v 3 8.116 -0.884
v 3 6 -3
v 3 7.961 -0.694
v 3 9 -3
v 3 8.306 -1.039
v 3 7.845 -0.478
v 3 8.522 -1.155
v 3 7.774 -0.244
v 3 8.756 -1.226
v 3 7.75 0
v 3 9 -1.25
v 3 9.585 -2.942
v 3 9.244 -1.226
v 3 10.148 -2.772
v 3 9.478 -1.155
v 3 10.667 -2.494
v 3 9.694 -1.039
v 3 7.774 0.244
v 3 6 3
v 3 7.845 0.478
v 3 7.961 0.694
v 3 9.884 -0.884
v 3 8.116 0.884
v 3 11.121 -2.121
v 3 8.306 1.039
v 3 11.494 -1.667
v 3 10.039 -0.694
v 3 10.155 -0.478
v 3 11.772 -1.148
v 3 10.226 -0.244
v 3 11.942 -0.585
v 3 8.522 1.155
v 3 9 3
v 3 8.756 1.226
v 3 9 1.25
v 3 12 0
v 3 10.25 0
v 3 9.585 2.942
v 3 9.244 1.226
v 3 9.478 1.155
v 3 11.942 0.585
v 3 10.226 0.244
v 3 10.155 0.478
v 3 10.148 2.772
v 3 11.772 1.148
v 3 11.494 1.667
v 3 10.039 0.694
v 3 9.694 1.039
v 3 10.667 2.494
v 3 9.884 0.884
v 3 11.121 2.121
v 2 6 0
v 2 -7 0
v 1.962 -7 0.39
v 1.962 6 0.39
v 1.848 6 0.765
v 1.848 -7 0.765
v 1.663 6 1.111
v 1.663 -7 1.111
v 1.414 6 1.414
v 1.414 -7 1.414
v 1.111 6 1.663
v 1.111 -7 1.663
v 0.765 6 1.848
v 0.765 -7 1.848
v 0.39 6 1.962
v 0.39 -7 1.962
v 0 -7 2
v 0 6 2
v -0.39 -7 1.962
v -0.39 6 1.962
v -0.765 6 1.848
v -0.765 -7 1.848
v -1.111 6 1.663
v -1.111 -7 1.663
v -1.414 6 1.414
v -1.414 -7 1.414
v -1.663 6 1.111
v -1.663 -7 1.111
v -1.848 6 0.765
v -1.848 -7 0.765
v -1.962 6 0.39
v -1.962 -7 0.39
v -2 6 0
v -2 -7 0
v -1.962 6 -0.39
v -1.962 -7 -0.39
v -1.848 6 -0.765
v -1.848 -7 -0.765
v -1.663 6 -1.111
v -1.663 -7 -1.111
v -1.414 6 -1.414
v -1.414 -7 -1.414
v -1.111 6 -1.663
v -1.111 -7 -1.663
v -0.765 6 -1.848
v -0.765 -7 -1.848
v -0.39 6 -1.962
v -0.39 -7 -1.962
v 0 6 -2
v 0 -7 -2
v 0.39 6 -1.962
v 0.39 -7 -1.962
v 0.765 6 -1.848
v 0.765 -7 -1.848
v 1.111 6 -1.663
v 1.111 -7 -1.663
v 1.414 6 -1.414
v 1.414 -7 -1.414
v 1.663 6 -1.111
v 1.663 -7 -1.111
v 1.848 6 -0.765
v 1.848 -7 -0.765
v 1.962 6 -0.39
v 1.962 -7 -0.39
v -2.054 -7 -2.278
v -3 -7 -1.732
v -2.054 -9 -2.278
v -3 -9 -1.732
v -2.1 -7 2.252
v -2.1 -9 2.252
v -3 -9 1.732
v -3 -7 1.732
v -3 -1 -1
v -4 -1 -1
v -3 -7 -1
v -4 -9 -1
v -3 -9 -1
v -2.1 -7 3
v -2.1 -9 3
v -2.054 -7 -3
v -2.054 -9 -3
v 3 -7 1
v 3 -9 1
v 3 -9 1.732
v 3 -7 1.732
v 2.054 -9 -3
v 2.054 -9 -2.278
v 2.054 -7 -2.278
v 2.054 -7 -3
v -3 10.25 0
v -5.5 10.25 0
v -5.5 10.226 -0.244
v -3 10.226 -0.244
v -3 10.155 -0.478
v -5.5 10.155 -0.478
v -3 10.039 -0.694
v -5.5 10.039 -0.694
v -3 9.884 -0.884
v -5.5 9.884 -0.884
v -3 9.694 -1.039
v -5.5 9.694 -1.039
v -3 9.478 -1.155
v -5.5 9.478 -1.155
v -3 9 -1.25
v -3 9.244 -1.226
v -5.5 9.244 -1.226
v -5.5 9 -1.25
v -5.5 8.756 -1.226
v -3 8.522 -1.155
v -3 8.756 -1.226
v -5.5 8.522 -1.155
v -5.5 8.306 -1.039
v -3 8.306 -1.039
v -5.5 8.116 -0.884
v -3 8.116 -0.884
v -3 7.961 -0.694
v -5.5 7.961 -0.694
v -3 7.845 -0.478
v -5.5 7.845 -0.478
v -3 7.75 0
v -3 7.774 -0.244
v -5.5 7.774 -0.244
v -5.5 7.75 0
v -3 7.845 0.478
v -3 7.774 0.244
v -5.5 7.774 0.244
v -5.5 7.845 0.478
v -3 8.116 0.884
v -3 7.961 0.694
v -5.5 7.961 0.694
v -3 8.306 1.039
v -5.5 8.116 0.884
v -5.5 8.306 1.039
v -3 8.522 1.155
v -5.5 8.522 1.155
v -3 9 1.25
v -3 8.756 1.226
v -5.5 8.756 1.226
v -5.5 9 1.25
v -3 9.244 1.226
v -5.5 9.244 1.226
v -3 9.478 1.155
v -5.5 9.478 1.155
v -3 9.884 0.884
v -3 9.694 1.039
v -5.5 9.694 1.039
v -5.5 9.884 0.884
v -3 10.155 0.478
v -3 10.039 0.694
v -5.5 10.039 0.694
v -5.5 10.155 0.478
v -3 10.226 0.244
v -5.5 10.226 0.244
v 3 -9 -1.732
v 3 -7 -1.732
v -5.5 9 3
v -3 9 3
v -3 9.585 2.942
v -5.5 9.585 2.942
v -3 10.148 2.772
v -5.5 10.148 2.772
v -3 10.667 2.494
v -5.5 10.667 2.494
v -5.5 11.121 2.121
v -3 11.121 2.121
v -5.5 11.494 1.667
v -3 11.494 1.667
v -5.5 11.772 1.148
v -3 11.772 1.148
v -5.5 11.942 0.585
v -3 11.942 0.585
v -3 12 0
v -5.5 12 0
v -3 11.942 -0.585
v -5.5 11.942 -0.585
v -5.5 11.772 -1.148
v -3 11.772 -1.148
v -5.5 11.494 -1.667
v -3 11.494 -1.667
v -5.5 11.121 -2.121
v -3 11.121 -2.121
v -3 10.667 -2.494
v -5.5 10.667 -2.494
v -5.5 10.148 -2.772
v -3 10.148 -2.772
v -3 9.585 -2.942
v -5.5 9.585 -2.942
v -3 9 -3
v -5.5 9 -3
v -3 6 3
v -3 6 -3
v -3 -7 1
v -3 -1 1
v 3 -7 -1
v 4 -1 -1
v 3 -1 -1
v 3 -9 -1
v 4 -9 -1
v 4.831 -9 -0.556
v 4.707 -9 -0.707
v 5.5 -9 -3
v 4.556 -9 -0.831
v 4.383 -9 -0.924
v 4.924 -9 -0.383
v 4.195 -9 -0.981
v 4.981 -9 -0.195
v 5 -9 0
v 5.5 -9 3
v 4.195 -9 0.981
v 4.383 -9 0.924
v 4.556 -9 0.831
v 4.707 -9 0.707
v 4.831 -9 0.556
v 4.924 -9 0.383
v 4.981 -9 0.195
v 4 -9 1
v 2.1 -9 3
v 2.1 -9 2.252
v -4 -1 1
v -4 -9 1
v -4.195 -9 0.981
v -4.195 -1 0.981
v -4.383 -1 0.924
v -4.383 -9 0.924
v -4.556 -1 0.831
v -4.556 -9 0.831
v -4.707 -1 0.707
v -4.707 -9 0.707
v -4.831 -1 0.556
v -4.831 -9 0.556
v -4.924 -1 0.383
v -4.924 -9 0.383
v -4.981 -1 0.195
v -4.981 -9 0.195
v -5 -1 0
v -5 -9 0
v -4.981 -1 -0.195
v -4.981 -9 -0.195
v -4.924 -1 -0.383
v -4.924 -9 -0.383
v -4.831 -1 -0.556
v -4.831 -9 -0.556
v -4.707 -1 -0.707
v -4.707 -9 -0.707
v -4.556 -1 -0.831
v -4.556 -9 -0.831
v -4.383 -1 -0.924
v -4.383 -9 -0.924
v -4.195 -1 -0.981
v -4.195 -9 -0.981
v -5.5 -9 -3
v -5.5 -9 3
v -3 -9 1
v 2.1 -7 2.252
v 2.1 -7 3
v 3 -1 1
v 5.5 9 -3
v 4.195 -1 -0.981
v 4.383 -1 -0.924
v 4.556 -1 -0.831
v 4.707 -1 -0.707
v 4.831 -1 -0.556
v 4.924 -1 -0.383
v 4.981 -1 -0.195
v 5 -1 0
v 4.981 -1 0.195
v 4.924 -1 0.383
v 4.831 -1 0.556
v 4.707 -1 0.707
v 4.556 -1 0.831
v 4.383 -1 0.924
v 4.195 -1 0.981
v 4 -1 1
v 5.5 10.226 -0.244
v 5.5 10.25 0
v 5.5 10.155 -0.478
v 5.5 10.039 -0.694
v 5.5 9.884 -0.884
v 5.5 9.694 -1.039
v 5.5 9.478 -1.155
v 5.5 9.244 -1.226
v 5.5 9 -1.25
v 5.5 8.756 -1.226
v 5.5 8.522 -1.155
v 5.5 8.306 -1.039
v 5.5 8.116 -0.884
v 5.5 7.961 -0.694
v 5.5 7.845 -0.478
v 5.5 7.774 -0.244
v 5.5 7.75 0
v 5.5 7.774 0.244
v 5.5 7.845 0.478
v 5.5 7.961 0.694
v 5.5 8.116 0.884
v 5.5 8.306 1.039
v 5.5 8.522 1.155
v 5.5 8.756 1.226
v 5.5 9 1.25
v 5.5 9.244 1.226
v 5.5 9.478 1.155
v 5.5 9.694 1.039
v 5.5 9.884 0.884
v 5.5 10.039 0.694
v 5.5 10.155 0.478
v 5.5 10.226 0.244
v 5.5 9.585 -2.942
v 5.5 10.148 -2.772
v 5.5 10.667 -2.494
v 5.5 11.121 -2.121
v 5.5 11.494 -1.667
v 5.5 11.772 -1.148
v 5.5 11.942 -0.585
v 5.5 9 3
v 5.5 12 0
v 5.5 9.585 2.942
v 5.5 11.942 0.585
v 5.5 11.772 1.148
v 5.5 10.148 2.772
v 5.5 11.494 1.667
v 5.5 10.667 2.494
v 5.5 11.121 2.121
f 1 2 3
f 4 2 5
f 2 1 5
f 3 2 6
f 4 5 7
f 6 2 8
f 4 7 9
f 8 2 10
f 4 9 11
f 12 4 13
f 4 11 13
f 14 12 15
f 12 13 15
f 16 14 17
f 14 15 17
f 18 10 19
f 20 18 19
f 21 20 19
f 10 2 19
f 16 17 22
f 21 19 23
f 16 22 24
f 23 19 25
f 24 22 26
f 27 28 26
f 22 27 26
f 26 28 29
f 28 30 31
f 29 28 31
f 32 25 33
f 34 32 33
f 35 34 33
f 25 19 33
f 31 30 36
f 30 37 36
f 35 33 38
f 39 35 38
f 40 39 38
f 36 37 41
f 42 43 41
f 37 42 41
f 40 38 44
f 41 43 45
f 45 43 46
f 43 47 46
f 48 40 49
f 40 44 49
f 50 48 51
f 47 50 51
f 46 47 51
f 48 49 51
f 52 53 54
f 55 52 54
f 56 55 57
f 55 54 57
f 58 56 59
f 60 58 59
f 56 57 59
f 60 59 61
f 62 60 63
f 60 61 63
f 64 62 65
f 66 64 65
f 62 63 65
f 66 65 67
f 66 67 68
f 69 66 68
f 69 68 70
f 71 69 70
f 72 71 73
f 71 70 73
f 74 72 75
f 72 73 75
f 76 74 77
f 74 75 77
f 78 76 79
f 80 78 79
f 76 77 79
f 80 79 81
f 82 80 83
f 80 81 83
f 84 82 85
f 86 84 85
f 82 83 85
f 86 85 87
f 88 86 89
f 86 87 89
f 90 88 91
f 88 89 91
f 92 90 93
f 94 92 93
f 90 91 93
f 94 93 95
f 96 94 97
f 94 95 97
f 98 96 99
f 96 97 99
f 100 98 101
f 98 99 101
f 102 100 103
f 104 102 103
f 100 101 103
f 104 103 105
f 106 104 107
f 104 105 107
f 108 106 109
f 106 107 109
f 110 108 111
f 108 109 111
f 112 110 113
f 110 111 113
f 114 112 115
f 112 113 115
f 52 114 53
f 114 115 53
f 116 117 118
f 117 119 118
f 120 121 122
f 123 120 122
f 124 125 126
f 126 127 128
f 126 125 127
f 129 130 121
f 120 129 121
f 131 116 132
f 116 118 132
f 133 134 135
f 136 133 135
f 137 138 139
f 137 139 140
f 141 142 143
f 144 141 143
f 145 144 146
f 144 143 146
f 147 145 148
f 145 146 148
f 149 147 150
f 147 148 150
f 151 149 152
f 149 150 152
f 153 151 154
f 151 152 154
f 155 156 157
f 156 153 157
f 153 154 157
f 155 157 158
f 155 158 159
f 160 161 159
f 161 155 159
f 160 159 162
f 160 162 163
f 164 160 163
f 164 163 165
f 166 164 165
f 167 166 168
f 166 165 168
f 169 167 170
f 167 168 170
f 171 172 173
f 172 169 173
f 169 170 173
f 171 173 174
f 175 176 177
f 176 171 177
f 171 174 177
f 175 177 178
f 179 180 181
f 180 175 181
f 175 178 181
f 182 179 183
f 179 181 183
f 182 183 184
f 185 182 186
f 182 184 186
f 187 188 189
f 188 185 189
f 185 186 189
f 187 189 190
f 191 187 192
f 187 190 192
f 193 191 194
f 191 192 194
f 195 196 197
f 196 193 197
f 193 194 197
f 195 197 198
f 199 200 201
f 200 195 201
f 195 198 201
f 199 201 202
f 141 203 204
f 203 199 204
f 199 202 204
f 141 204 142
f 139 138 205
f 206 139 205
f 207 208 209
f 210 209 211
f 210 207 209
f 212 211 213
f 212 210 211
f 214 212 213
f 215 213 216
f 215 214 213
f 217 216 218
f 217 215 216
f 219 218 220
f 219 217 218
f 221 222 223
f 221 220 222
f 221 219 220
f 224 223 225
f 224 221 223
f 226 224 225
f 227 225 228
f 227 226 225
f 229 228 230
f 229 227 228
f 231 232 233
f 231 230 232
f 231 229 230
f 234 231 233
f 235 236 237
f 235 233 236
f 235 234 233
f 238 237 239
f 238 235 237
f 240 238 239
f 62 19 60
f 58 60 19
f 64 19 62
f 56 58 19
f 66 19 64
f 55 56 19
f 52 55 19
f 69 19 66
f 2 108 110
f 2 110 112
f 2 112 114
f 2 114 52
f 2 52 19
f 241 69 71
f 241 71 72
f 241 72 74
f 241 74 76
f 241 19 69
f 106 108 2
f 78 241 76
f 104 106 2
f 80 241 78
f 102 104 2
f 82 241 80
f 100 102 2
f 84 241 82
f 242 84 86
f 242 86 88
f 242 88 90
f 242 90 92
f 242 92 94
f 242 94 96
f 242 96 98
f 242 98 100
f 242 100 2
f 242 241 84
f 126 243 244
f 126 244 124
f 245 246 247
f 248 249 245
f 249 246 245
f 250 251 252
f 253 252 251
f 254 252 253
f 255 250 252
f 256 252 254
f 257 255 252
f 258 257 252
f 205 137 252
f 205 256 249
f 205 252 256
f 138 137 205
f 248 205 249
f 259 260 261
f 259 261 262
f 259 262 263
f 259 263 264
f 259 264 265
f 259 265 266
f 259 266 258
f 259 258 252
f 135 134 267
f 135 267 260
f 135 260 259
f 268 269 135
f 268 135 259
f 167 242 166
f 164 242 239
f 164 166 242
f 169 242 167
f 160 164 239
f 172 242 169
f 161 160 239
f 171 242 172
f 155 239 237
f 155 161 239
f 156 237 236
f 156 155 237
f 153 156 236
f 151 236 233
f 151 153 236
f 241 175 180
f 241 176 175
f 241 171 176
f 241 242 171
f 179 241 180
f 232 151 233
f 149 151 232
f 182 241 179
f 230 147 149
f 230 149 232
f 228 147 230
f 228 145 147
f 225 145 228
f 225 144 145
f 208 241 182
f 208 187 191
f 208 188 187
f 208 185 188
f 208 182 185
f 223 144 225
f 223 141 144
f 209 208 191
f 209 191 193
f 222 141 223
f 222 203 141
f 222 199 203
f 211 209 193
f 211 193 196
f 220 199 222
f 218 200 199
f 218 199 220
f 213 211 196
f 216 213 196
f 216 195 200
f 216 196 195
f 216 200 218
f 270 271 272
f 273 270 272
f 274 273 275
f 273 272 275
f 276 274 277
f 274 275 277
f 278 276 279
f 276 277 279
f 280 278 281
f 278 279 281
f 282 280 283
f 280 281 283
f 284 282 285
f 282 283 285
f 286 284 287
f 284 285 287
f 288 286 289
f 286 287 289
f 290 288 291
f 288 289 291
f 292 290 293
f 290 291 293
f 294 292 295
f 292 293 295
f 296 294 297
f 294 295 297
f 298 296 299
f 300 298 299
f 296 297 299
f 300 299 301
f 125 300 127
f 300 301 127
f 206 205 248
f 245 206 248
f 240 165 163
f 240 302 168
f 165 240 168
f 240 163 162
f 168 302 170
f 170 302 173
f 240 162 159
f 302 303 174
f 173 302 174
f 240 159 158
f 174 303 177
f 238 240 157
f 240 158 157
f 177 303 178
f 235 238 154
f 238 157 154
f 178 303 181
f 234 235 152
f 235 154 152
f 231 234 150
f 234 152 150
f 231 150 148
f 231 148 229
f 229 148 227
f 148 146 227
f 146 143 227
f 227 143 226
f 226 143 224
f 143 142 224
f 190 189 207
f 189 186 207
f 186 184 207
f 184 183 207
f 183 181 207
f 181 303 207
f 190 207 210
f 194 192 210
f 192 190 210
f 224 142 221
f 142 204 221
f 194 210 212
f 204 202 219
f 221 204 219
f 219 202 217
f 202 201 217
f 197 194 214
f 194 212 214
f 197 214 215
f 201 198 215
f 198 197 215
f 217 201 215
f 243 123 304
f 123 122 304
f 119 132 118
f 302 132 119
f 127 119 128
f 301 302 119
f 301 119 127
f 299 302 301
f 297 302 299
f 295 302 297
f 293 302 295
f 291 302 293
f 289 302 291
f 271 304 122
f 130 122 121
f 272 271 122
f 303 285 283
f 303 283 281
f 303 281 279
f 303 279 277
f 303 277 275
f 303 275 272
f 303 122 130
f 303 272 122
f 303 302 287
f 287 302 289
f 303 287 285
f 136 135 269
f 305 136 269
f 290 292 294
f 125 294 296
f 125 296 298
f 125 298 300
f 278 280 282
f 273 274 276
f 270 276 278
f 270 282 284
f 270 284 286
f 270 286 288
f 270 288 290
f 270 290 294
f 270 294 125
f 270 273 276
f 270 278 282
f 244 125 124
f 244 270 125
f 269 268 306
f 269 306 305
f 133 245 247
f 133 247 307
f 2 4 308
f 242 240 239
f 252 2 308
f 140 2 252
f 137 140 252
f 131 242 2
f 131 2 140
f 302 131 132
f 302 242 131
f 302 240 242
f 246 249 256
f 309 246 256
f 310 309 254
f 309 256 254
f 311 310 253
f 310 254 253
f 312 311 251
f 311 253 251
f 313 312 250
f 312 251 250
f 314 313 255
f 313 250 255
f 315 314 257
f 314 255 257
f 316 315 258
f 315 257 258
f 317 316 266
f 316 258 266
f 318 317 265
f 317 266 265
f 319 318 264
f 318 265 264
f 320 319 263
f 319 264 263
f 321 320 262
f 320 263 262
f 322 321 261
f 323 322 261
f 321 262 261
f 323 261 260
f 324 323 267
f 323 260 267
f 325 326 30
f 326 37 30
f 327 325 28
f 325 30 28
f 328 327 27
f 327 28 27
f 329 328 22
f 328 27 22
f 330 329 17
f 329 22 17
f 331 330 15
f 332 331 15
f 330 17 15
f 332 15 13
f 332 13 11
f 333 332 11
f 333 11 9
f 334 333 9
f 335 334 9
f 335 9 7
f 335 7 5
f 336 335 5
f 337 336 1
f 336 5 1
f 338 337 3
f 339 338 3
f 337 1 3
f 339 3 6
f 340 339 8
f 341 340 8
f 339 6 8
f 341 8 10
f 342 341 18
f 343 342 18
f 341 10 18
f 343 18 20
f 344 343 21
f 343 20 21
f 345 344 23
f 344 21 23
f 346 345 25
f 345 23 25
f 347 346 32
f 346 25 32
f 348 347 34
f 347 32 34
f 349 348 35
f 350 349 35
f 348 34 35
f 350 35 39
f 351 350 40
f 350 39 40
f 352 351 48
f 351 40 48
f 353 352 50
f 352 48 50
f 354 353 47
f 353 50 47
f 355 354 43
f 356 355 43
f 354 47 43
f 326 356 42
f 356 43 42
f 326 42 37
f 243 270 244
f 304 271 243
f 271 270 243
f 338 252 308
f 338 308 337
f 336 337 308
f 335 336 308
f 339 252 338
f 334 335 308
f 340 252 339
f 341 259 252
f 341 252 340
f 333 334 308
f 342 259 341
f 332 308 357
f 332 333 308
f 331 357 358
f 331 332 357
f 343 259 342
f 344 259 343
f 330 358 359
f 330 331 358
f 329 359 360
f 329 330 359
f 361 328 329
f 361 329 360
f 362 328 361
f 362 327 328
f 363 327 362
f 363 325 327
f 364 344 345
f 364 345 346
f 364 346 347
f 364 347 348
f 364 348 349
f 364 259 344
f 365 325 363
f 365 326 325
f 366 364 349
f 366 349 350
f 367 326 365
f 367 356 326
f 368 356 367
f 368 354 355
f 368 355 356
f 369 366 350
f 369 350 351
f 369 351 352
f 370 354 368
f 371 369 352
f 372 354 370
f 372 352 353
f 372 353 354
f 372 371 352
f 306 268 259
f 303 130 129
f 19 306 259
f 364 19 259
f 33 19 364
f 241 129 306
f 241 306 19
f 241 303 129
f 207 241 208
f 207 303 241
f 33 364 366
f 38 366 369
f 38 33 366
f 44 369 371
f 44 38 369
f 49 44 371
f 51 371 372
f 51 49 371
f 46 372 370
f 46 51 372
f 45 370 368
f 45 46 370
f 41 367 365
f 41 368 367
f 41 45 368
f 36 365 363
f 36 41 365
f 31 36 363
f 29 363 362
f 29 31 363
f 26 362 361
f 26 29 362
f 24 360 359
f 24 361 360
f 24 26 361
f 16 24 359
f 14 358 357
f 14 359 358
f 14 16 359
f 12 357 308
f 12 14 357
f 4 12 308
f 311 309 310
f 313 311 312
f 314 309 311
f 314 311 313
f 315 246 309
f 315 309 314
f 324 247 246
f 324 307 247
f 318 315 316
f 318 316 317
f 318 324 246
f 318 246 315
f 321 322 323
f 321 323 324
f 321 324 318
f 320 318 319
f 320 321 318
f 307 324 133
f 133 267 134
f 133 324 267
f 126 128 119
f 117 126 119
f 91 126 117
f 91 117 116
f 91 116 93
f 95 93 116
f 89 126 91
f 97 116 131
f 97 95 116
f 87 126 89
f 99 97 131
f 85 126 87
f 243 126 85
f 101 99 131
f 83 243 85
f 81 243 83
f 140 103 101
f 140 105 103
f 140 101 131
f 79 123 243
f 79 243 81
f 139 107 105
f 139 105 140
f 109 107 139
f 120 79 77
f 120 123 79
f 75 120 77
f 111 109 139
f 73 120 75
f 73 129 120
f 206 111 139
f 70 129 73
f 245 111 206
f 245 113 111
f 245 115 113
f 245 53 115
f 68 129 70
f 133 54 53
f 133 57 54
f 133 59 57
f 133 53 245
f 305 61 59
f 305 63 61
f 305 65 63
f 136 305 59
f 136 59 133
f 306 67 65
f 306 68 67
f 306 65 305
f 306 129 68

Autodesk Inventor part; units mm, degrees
ref_plane "plane_support" through (-5.5, -8, -3) normal (0, -1, 0) x (1, 0, 0)
ref_plane "plane_support_frontb" through (-2.5, 0, 0) normal (1, 0, 0) x (0, 0, -1)
ref_plane "plane_support_frontt" through (2.5, 0, 0) normal (-1, 0, 0) x (0, 0, 1)
sketch "Sketch14" plane through (0, 0, 0) normal (1, 0, 0) x (0, 1, 0)
  line L0 (-13.2, 0) -> (16.2, 0) projected
  line L1 (0, -4.2) -> (0, 4.2) projected
  line L2 (9, -3) -> (-9, -3)
  line L3 (-9, -3) -> (-9, 3)
  line L4 (-9, 3) -> (9, 3)
  line L5 (9, 3) -> (9, -3) construction
  line L6 (9, -3) -> (-9, 3) construction
  line L7 (-9, -3) -> (9, 3) construction
  line L8 (5.5, 3) -> (5.5, -3) construction
  line L9 (-6.5, 3) -> (-6.5, -3) construction
  arc A0 (9, -3) -> (9, 3) centre (9, 0) ccw
  circle A1 centre (9, 0) radius 1.25
  circle A2 centre (9, 0) radius 3 construction
  line L10 (6, 3) -> (6, -3) construction
  point P0 (0, 0)
  point P1 (0, 0)
  dimension "d72" = 6
  dimension "d73" = 12
  dimension "d74" = 2.5
  dimension "d75" = 2.5
  dimension "d76" = 0.5
extrude "ext_main" add sketch "Sketch14" along normal mid plane 11 contours L3 L4 L1 L0 | L0 L1 L2 L3 | L1 L4 A0 L0 A1 | L0 A1 A0 L2 L1
sketch "Sketch15" plane through (0, 0, 0) normal (1, 0, 0) x (0, 1, 0)
  circle A0 centre (9, 0) radius 1.25 projected
  arc A1 (9, -3) -> (9, 3) centre (9, 0) ccw projected
  circle A2 centre (9, 0) radius 3
  line L0 (6, 3) -> (6, -3)
  line L1 (9, 3) -> (-9, 3) projected
  line L2 (-9, -3) -> (9, -3) projected
  line L3 (-13.2, 0) -> (16.2, 0) projected
  point P0 (0, 0)
extrude "ext_cut_front" cut sketch "Sketch15" along normal mid plane 6 contours L3 A1 A2 A0 | A0 L3 A2 A1 | L0 L1 A2 | A2 L2 L0
sketch "sk_channel_nut" plane through (-5.5, -9, -3) normal (0, -1, 0) x (1, 0, 0)
  line L0 (-2.2, 3) -> (13.2, 3) projected
  line L1 (5.5, -1.8497) -> (5.5, 7.8497) projected
  circle A0 centre (5.5, 3) radius 2
  line L2 (5.5, 6.4641) -> (2.5, 4.7321)
  line L3 (2.5, 4.7321) -> (2.5, 1.2679)
  line L4 (2.5, 1.2679) -> (5.5, -0.4641)
  line L5 (5.5, -0.4641) -> (8.5, 1.2679)
  line L6 (8.5, 1.2679) -> (8.5, 4.7321)
  line L7 (8.5, 4.7321) -> (5.5, 6.4641)
  circle A1 centre (1.5, 3) radius 1
  circle A2 centre (9.5, 3) radius 1
  line L8 (1.5, 4) -> (2.5, 4)
  line L9 (1.5, 2) -> (2.5, 2)
  line L10 (9.5, 4) -> (8.5, 4)
  line L11 (9.5, 2) -> (8.5, 2)
  line L12 (11, 0) -> (0, 0) projected
  line L13 (11, 6) -> (0, 6) projected
  line L14 (0, 0) -> (0, 6) projected
  line L15 (3.4, 6) -> (3.4, 5.2517)
  line L16 (3.4456, 0.722) -> (3.4456, 0)
  line L17 (7.5544, 0.722) -> (7.5544, 0)
  line L18 (7.6, 6) -> (7.6, 5.2517)
  point P0 (5.5, 3)
  point P1 (2.5, 3)
  dimension "d85" = 4
  dimension "d86" = 120
  dimension "d87" = 6
  dimension "d88" = 2
  dimension "d95" = 4.2
extrude "ext_cut_channel" cut sketch "sk_channel_nut" against normal up to surface (15 mm away) contours A0 L1 L0 | L0 L1 A0 | L1 A0 L0 | L0 A0 L1
extrude "ext_cut_bottomscrews" cut sketch "sk_channel_nut" against normal blind 8 contours A1 L0 | L0 A1 | A1 L8 L3 | L3 L9 A1 | A2 L0 | A2 L11 L6 | L6 L10 A2 | L0 A2
extrude "ext_cut_bottom_nut" cut sketch "sk_channel_nut" against normal blind 2 contours L3 L2 L13 L1 A0 L0 | L0 A0 L1 L12 L4 L3 | L16 L4 L12 | L13 L2 L15 | A0 L1 L0 | L0 L1 A0 | L12 L1 L4 | L2 L1 L13 | L1 A0 L0 | L0 A0 L1 | L1 L13 L7 L6 L0 A0 | A0 L0 L6 L5 L12 L1 | L1 L12 L5 | L7 L13 L1 | L5 L17 L12 | L13 L18 L7
sketch "Sketch19" plane through (-5.5, -8, -3) normal (0, -1, 0) x (1, 0, 0)
  line L0 (3.4, 6) -> (7.6, 6) projected
  line L1 (3.4, 5.2517) -> (3.4, 6) projected
  line L2 (2.5, 4.7321) -> (3.4, 5.2517) projected
  line L3 (2.5, 4) -> (2.5, 4.7321) projected
  line L4 (2.5, 2) -> (2.5, 4) projected
  line L5 (2.5, 1.2679) -> (2.5, 2) projected
  line L6 (3.4456, 0.722) -> (2.5, 1.2679) projected
  line L7 (3.4456, 0) -> (3.4456, 0.722) projected
  line L8 (7.5544, 0) -> (3.4456, 0) projected
  line L9 (7.5544, 0.722) -> (7.5544, 0) projected
  line L10 (8.5, 1.2679) -> (7.5544, 0.722) projected
  line L11 (8.5, 2) -> (8.5, 1.2679) projected
  line L12 (8.5, 4) -> (8.5, 2) projected
  line L13 (8.5, 4.7321) -> (8.5, 4) projected
  line L14 (7.6, 5.2517) -> (8.5, 4.7321) projected
  line L15 (7.6, 6) -> (7.6, 5.2517) projected
  circle A0 centre (5.5, 3) radius 2 projected
  line L16 (3.9, 5.5) -> (7.1, 5.5) construction
  line L17 (7.1, 5.5) -> (7.1, 4.963)
  line L18 (7.1, 4.963) -> (8, 4.4434)
  line L19 (8, 4.4434) -> (8, 4)
  line L20 (8, 4) -> (8, 2)
  line L21 (8, 2) -> (8, 1.5566)
  line L22 (8, 1.5566) -> (7.0544, 1.0107)
  line L23 (7.0544, 1.0107) -> (7.0544, 0.5)
  line L24 (7.0544, 0.5) -> (3.9456, 0.5) construction
  line L25 (3.9456, 0.5) -> (3.9456, 1.0107)
  line L26 (3.9456, 1.0107) -> (3, 1.5566)
  line L27 (3, 1.5566) -> (3, 2)
  line L28 (3, 2) -> (3, 4)
  line L29 (3, 4) -> (3, 4.4434)
  line L30 (3, 4.4434) -> (3.9, 4.963)
  line L31 (3.9, 4.963) -> (3.9, 5.5)
  line L32 (3.9, 5.5) -> (7.1, 5.5)
  line L33 (7.1, 5.5) -> (7.1, 6)
  line L34 (7.1, 6) -> (3.9, 6)
  line L35 (3.9, 6) -> (3.9, 5.5)
  line L36 (3.9456, 0.5) -> (7.0544, 0.5)
  line L37 (7.0544, 0.5) -> (7.0544, 0)
  line L38 (7.0544, 0) -> (3.9456, 0)
  line L39 (3.9456, 0) -> (3.9456, 0.5)
  point P0 (5.5, 3)
  dimension "d97" = 0.4
sketch "Sketch20" plane through (-2.5, 0, 0) normal (1, 0, 0) x (0, 0, -1)
  circle A0 centre (0, 9) radius 1.25 projected
  arc A1 (3, 9) -> (-3, 9) centre (0, 9) ccw projected
  line L0 (-3, 6) -> (-3, 9) projected
  line L1 (3, 6) -> (-3, 6) projected
  line L2 (3, 9) -> (3, 6) projected
  line L3 (-3, 7) -> (3, 7)
  point P0 (0, 0)
  dimension "d102" = 1
equation "\"d73\" = linact_rod_effective_length"
equation "\"d74\" = nut_m3_thickness_max"
equation "\"d75\" = screw_m2_bore_loose"
equation "\"d87\" = nut_m3_width_acrossflats"
equation "\"d88\" = screw_m2_bore_selfthreading"
equation "\"d95\" = 0.7 * nut_m3_width_acrossflats"
equation "\"d89\" = linact_rod_effective_length + nut_m3_thickness_max"
equation "\"d93\" = 0.8 * nut_m3_thickness_max"
equation "\"d97\" = print_support_z_clearance"
equation "\"d102\" = print_support_xy_clearance"
equation "\"d96\" = print_support_xy_clearance"
equation "\"d100\" = print_support_z_clearance"
equation "\"d101\" = print_support_z_clearance"
equation "\"linact_rod_effective_length\" = 12"
equation "\"nut_m3_thickness_max\" = 2.5"
equation "\"screw_m2_bore_loose\" = 2.5"
equation "\"nut_m3_width_acrossflats\" = 6"
equation "\"screw_m2_bore_selfthreading\" = 2"
equation "\"print_support_z_clearance\" = 0.4"
equation "\"print_support_xy_clearance\" = 1"
properties part number "empty"
